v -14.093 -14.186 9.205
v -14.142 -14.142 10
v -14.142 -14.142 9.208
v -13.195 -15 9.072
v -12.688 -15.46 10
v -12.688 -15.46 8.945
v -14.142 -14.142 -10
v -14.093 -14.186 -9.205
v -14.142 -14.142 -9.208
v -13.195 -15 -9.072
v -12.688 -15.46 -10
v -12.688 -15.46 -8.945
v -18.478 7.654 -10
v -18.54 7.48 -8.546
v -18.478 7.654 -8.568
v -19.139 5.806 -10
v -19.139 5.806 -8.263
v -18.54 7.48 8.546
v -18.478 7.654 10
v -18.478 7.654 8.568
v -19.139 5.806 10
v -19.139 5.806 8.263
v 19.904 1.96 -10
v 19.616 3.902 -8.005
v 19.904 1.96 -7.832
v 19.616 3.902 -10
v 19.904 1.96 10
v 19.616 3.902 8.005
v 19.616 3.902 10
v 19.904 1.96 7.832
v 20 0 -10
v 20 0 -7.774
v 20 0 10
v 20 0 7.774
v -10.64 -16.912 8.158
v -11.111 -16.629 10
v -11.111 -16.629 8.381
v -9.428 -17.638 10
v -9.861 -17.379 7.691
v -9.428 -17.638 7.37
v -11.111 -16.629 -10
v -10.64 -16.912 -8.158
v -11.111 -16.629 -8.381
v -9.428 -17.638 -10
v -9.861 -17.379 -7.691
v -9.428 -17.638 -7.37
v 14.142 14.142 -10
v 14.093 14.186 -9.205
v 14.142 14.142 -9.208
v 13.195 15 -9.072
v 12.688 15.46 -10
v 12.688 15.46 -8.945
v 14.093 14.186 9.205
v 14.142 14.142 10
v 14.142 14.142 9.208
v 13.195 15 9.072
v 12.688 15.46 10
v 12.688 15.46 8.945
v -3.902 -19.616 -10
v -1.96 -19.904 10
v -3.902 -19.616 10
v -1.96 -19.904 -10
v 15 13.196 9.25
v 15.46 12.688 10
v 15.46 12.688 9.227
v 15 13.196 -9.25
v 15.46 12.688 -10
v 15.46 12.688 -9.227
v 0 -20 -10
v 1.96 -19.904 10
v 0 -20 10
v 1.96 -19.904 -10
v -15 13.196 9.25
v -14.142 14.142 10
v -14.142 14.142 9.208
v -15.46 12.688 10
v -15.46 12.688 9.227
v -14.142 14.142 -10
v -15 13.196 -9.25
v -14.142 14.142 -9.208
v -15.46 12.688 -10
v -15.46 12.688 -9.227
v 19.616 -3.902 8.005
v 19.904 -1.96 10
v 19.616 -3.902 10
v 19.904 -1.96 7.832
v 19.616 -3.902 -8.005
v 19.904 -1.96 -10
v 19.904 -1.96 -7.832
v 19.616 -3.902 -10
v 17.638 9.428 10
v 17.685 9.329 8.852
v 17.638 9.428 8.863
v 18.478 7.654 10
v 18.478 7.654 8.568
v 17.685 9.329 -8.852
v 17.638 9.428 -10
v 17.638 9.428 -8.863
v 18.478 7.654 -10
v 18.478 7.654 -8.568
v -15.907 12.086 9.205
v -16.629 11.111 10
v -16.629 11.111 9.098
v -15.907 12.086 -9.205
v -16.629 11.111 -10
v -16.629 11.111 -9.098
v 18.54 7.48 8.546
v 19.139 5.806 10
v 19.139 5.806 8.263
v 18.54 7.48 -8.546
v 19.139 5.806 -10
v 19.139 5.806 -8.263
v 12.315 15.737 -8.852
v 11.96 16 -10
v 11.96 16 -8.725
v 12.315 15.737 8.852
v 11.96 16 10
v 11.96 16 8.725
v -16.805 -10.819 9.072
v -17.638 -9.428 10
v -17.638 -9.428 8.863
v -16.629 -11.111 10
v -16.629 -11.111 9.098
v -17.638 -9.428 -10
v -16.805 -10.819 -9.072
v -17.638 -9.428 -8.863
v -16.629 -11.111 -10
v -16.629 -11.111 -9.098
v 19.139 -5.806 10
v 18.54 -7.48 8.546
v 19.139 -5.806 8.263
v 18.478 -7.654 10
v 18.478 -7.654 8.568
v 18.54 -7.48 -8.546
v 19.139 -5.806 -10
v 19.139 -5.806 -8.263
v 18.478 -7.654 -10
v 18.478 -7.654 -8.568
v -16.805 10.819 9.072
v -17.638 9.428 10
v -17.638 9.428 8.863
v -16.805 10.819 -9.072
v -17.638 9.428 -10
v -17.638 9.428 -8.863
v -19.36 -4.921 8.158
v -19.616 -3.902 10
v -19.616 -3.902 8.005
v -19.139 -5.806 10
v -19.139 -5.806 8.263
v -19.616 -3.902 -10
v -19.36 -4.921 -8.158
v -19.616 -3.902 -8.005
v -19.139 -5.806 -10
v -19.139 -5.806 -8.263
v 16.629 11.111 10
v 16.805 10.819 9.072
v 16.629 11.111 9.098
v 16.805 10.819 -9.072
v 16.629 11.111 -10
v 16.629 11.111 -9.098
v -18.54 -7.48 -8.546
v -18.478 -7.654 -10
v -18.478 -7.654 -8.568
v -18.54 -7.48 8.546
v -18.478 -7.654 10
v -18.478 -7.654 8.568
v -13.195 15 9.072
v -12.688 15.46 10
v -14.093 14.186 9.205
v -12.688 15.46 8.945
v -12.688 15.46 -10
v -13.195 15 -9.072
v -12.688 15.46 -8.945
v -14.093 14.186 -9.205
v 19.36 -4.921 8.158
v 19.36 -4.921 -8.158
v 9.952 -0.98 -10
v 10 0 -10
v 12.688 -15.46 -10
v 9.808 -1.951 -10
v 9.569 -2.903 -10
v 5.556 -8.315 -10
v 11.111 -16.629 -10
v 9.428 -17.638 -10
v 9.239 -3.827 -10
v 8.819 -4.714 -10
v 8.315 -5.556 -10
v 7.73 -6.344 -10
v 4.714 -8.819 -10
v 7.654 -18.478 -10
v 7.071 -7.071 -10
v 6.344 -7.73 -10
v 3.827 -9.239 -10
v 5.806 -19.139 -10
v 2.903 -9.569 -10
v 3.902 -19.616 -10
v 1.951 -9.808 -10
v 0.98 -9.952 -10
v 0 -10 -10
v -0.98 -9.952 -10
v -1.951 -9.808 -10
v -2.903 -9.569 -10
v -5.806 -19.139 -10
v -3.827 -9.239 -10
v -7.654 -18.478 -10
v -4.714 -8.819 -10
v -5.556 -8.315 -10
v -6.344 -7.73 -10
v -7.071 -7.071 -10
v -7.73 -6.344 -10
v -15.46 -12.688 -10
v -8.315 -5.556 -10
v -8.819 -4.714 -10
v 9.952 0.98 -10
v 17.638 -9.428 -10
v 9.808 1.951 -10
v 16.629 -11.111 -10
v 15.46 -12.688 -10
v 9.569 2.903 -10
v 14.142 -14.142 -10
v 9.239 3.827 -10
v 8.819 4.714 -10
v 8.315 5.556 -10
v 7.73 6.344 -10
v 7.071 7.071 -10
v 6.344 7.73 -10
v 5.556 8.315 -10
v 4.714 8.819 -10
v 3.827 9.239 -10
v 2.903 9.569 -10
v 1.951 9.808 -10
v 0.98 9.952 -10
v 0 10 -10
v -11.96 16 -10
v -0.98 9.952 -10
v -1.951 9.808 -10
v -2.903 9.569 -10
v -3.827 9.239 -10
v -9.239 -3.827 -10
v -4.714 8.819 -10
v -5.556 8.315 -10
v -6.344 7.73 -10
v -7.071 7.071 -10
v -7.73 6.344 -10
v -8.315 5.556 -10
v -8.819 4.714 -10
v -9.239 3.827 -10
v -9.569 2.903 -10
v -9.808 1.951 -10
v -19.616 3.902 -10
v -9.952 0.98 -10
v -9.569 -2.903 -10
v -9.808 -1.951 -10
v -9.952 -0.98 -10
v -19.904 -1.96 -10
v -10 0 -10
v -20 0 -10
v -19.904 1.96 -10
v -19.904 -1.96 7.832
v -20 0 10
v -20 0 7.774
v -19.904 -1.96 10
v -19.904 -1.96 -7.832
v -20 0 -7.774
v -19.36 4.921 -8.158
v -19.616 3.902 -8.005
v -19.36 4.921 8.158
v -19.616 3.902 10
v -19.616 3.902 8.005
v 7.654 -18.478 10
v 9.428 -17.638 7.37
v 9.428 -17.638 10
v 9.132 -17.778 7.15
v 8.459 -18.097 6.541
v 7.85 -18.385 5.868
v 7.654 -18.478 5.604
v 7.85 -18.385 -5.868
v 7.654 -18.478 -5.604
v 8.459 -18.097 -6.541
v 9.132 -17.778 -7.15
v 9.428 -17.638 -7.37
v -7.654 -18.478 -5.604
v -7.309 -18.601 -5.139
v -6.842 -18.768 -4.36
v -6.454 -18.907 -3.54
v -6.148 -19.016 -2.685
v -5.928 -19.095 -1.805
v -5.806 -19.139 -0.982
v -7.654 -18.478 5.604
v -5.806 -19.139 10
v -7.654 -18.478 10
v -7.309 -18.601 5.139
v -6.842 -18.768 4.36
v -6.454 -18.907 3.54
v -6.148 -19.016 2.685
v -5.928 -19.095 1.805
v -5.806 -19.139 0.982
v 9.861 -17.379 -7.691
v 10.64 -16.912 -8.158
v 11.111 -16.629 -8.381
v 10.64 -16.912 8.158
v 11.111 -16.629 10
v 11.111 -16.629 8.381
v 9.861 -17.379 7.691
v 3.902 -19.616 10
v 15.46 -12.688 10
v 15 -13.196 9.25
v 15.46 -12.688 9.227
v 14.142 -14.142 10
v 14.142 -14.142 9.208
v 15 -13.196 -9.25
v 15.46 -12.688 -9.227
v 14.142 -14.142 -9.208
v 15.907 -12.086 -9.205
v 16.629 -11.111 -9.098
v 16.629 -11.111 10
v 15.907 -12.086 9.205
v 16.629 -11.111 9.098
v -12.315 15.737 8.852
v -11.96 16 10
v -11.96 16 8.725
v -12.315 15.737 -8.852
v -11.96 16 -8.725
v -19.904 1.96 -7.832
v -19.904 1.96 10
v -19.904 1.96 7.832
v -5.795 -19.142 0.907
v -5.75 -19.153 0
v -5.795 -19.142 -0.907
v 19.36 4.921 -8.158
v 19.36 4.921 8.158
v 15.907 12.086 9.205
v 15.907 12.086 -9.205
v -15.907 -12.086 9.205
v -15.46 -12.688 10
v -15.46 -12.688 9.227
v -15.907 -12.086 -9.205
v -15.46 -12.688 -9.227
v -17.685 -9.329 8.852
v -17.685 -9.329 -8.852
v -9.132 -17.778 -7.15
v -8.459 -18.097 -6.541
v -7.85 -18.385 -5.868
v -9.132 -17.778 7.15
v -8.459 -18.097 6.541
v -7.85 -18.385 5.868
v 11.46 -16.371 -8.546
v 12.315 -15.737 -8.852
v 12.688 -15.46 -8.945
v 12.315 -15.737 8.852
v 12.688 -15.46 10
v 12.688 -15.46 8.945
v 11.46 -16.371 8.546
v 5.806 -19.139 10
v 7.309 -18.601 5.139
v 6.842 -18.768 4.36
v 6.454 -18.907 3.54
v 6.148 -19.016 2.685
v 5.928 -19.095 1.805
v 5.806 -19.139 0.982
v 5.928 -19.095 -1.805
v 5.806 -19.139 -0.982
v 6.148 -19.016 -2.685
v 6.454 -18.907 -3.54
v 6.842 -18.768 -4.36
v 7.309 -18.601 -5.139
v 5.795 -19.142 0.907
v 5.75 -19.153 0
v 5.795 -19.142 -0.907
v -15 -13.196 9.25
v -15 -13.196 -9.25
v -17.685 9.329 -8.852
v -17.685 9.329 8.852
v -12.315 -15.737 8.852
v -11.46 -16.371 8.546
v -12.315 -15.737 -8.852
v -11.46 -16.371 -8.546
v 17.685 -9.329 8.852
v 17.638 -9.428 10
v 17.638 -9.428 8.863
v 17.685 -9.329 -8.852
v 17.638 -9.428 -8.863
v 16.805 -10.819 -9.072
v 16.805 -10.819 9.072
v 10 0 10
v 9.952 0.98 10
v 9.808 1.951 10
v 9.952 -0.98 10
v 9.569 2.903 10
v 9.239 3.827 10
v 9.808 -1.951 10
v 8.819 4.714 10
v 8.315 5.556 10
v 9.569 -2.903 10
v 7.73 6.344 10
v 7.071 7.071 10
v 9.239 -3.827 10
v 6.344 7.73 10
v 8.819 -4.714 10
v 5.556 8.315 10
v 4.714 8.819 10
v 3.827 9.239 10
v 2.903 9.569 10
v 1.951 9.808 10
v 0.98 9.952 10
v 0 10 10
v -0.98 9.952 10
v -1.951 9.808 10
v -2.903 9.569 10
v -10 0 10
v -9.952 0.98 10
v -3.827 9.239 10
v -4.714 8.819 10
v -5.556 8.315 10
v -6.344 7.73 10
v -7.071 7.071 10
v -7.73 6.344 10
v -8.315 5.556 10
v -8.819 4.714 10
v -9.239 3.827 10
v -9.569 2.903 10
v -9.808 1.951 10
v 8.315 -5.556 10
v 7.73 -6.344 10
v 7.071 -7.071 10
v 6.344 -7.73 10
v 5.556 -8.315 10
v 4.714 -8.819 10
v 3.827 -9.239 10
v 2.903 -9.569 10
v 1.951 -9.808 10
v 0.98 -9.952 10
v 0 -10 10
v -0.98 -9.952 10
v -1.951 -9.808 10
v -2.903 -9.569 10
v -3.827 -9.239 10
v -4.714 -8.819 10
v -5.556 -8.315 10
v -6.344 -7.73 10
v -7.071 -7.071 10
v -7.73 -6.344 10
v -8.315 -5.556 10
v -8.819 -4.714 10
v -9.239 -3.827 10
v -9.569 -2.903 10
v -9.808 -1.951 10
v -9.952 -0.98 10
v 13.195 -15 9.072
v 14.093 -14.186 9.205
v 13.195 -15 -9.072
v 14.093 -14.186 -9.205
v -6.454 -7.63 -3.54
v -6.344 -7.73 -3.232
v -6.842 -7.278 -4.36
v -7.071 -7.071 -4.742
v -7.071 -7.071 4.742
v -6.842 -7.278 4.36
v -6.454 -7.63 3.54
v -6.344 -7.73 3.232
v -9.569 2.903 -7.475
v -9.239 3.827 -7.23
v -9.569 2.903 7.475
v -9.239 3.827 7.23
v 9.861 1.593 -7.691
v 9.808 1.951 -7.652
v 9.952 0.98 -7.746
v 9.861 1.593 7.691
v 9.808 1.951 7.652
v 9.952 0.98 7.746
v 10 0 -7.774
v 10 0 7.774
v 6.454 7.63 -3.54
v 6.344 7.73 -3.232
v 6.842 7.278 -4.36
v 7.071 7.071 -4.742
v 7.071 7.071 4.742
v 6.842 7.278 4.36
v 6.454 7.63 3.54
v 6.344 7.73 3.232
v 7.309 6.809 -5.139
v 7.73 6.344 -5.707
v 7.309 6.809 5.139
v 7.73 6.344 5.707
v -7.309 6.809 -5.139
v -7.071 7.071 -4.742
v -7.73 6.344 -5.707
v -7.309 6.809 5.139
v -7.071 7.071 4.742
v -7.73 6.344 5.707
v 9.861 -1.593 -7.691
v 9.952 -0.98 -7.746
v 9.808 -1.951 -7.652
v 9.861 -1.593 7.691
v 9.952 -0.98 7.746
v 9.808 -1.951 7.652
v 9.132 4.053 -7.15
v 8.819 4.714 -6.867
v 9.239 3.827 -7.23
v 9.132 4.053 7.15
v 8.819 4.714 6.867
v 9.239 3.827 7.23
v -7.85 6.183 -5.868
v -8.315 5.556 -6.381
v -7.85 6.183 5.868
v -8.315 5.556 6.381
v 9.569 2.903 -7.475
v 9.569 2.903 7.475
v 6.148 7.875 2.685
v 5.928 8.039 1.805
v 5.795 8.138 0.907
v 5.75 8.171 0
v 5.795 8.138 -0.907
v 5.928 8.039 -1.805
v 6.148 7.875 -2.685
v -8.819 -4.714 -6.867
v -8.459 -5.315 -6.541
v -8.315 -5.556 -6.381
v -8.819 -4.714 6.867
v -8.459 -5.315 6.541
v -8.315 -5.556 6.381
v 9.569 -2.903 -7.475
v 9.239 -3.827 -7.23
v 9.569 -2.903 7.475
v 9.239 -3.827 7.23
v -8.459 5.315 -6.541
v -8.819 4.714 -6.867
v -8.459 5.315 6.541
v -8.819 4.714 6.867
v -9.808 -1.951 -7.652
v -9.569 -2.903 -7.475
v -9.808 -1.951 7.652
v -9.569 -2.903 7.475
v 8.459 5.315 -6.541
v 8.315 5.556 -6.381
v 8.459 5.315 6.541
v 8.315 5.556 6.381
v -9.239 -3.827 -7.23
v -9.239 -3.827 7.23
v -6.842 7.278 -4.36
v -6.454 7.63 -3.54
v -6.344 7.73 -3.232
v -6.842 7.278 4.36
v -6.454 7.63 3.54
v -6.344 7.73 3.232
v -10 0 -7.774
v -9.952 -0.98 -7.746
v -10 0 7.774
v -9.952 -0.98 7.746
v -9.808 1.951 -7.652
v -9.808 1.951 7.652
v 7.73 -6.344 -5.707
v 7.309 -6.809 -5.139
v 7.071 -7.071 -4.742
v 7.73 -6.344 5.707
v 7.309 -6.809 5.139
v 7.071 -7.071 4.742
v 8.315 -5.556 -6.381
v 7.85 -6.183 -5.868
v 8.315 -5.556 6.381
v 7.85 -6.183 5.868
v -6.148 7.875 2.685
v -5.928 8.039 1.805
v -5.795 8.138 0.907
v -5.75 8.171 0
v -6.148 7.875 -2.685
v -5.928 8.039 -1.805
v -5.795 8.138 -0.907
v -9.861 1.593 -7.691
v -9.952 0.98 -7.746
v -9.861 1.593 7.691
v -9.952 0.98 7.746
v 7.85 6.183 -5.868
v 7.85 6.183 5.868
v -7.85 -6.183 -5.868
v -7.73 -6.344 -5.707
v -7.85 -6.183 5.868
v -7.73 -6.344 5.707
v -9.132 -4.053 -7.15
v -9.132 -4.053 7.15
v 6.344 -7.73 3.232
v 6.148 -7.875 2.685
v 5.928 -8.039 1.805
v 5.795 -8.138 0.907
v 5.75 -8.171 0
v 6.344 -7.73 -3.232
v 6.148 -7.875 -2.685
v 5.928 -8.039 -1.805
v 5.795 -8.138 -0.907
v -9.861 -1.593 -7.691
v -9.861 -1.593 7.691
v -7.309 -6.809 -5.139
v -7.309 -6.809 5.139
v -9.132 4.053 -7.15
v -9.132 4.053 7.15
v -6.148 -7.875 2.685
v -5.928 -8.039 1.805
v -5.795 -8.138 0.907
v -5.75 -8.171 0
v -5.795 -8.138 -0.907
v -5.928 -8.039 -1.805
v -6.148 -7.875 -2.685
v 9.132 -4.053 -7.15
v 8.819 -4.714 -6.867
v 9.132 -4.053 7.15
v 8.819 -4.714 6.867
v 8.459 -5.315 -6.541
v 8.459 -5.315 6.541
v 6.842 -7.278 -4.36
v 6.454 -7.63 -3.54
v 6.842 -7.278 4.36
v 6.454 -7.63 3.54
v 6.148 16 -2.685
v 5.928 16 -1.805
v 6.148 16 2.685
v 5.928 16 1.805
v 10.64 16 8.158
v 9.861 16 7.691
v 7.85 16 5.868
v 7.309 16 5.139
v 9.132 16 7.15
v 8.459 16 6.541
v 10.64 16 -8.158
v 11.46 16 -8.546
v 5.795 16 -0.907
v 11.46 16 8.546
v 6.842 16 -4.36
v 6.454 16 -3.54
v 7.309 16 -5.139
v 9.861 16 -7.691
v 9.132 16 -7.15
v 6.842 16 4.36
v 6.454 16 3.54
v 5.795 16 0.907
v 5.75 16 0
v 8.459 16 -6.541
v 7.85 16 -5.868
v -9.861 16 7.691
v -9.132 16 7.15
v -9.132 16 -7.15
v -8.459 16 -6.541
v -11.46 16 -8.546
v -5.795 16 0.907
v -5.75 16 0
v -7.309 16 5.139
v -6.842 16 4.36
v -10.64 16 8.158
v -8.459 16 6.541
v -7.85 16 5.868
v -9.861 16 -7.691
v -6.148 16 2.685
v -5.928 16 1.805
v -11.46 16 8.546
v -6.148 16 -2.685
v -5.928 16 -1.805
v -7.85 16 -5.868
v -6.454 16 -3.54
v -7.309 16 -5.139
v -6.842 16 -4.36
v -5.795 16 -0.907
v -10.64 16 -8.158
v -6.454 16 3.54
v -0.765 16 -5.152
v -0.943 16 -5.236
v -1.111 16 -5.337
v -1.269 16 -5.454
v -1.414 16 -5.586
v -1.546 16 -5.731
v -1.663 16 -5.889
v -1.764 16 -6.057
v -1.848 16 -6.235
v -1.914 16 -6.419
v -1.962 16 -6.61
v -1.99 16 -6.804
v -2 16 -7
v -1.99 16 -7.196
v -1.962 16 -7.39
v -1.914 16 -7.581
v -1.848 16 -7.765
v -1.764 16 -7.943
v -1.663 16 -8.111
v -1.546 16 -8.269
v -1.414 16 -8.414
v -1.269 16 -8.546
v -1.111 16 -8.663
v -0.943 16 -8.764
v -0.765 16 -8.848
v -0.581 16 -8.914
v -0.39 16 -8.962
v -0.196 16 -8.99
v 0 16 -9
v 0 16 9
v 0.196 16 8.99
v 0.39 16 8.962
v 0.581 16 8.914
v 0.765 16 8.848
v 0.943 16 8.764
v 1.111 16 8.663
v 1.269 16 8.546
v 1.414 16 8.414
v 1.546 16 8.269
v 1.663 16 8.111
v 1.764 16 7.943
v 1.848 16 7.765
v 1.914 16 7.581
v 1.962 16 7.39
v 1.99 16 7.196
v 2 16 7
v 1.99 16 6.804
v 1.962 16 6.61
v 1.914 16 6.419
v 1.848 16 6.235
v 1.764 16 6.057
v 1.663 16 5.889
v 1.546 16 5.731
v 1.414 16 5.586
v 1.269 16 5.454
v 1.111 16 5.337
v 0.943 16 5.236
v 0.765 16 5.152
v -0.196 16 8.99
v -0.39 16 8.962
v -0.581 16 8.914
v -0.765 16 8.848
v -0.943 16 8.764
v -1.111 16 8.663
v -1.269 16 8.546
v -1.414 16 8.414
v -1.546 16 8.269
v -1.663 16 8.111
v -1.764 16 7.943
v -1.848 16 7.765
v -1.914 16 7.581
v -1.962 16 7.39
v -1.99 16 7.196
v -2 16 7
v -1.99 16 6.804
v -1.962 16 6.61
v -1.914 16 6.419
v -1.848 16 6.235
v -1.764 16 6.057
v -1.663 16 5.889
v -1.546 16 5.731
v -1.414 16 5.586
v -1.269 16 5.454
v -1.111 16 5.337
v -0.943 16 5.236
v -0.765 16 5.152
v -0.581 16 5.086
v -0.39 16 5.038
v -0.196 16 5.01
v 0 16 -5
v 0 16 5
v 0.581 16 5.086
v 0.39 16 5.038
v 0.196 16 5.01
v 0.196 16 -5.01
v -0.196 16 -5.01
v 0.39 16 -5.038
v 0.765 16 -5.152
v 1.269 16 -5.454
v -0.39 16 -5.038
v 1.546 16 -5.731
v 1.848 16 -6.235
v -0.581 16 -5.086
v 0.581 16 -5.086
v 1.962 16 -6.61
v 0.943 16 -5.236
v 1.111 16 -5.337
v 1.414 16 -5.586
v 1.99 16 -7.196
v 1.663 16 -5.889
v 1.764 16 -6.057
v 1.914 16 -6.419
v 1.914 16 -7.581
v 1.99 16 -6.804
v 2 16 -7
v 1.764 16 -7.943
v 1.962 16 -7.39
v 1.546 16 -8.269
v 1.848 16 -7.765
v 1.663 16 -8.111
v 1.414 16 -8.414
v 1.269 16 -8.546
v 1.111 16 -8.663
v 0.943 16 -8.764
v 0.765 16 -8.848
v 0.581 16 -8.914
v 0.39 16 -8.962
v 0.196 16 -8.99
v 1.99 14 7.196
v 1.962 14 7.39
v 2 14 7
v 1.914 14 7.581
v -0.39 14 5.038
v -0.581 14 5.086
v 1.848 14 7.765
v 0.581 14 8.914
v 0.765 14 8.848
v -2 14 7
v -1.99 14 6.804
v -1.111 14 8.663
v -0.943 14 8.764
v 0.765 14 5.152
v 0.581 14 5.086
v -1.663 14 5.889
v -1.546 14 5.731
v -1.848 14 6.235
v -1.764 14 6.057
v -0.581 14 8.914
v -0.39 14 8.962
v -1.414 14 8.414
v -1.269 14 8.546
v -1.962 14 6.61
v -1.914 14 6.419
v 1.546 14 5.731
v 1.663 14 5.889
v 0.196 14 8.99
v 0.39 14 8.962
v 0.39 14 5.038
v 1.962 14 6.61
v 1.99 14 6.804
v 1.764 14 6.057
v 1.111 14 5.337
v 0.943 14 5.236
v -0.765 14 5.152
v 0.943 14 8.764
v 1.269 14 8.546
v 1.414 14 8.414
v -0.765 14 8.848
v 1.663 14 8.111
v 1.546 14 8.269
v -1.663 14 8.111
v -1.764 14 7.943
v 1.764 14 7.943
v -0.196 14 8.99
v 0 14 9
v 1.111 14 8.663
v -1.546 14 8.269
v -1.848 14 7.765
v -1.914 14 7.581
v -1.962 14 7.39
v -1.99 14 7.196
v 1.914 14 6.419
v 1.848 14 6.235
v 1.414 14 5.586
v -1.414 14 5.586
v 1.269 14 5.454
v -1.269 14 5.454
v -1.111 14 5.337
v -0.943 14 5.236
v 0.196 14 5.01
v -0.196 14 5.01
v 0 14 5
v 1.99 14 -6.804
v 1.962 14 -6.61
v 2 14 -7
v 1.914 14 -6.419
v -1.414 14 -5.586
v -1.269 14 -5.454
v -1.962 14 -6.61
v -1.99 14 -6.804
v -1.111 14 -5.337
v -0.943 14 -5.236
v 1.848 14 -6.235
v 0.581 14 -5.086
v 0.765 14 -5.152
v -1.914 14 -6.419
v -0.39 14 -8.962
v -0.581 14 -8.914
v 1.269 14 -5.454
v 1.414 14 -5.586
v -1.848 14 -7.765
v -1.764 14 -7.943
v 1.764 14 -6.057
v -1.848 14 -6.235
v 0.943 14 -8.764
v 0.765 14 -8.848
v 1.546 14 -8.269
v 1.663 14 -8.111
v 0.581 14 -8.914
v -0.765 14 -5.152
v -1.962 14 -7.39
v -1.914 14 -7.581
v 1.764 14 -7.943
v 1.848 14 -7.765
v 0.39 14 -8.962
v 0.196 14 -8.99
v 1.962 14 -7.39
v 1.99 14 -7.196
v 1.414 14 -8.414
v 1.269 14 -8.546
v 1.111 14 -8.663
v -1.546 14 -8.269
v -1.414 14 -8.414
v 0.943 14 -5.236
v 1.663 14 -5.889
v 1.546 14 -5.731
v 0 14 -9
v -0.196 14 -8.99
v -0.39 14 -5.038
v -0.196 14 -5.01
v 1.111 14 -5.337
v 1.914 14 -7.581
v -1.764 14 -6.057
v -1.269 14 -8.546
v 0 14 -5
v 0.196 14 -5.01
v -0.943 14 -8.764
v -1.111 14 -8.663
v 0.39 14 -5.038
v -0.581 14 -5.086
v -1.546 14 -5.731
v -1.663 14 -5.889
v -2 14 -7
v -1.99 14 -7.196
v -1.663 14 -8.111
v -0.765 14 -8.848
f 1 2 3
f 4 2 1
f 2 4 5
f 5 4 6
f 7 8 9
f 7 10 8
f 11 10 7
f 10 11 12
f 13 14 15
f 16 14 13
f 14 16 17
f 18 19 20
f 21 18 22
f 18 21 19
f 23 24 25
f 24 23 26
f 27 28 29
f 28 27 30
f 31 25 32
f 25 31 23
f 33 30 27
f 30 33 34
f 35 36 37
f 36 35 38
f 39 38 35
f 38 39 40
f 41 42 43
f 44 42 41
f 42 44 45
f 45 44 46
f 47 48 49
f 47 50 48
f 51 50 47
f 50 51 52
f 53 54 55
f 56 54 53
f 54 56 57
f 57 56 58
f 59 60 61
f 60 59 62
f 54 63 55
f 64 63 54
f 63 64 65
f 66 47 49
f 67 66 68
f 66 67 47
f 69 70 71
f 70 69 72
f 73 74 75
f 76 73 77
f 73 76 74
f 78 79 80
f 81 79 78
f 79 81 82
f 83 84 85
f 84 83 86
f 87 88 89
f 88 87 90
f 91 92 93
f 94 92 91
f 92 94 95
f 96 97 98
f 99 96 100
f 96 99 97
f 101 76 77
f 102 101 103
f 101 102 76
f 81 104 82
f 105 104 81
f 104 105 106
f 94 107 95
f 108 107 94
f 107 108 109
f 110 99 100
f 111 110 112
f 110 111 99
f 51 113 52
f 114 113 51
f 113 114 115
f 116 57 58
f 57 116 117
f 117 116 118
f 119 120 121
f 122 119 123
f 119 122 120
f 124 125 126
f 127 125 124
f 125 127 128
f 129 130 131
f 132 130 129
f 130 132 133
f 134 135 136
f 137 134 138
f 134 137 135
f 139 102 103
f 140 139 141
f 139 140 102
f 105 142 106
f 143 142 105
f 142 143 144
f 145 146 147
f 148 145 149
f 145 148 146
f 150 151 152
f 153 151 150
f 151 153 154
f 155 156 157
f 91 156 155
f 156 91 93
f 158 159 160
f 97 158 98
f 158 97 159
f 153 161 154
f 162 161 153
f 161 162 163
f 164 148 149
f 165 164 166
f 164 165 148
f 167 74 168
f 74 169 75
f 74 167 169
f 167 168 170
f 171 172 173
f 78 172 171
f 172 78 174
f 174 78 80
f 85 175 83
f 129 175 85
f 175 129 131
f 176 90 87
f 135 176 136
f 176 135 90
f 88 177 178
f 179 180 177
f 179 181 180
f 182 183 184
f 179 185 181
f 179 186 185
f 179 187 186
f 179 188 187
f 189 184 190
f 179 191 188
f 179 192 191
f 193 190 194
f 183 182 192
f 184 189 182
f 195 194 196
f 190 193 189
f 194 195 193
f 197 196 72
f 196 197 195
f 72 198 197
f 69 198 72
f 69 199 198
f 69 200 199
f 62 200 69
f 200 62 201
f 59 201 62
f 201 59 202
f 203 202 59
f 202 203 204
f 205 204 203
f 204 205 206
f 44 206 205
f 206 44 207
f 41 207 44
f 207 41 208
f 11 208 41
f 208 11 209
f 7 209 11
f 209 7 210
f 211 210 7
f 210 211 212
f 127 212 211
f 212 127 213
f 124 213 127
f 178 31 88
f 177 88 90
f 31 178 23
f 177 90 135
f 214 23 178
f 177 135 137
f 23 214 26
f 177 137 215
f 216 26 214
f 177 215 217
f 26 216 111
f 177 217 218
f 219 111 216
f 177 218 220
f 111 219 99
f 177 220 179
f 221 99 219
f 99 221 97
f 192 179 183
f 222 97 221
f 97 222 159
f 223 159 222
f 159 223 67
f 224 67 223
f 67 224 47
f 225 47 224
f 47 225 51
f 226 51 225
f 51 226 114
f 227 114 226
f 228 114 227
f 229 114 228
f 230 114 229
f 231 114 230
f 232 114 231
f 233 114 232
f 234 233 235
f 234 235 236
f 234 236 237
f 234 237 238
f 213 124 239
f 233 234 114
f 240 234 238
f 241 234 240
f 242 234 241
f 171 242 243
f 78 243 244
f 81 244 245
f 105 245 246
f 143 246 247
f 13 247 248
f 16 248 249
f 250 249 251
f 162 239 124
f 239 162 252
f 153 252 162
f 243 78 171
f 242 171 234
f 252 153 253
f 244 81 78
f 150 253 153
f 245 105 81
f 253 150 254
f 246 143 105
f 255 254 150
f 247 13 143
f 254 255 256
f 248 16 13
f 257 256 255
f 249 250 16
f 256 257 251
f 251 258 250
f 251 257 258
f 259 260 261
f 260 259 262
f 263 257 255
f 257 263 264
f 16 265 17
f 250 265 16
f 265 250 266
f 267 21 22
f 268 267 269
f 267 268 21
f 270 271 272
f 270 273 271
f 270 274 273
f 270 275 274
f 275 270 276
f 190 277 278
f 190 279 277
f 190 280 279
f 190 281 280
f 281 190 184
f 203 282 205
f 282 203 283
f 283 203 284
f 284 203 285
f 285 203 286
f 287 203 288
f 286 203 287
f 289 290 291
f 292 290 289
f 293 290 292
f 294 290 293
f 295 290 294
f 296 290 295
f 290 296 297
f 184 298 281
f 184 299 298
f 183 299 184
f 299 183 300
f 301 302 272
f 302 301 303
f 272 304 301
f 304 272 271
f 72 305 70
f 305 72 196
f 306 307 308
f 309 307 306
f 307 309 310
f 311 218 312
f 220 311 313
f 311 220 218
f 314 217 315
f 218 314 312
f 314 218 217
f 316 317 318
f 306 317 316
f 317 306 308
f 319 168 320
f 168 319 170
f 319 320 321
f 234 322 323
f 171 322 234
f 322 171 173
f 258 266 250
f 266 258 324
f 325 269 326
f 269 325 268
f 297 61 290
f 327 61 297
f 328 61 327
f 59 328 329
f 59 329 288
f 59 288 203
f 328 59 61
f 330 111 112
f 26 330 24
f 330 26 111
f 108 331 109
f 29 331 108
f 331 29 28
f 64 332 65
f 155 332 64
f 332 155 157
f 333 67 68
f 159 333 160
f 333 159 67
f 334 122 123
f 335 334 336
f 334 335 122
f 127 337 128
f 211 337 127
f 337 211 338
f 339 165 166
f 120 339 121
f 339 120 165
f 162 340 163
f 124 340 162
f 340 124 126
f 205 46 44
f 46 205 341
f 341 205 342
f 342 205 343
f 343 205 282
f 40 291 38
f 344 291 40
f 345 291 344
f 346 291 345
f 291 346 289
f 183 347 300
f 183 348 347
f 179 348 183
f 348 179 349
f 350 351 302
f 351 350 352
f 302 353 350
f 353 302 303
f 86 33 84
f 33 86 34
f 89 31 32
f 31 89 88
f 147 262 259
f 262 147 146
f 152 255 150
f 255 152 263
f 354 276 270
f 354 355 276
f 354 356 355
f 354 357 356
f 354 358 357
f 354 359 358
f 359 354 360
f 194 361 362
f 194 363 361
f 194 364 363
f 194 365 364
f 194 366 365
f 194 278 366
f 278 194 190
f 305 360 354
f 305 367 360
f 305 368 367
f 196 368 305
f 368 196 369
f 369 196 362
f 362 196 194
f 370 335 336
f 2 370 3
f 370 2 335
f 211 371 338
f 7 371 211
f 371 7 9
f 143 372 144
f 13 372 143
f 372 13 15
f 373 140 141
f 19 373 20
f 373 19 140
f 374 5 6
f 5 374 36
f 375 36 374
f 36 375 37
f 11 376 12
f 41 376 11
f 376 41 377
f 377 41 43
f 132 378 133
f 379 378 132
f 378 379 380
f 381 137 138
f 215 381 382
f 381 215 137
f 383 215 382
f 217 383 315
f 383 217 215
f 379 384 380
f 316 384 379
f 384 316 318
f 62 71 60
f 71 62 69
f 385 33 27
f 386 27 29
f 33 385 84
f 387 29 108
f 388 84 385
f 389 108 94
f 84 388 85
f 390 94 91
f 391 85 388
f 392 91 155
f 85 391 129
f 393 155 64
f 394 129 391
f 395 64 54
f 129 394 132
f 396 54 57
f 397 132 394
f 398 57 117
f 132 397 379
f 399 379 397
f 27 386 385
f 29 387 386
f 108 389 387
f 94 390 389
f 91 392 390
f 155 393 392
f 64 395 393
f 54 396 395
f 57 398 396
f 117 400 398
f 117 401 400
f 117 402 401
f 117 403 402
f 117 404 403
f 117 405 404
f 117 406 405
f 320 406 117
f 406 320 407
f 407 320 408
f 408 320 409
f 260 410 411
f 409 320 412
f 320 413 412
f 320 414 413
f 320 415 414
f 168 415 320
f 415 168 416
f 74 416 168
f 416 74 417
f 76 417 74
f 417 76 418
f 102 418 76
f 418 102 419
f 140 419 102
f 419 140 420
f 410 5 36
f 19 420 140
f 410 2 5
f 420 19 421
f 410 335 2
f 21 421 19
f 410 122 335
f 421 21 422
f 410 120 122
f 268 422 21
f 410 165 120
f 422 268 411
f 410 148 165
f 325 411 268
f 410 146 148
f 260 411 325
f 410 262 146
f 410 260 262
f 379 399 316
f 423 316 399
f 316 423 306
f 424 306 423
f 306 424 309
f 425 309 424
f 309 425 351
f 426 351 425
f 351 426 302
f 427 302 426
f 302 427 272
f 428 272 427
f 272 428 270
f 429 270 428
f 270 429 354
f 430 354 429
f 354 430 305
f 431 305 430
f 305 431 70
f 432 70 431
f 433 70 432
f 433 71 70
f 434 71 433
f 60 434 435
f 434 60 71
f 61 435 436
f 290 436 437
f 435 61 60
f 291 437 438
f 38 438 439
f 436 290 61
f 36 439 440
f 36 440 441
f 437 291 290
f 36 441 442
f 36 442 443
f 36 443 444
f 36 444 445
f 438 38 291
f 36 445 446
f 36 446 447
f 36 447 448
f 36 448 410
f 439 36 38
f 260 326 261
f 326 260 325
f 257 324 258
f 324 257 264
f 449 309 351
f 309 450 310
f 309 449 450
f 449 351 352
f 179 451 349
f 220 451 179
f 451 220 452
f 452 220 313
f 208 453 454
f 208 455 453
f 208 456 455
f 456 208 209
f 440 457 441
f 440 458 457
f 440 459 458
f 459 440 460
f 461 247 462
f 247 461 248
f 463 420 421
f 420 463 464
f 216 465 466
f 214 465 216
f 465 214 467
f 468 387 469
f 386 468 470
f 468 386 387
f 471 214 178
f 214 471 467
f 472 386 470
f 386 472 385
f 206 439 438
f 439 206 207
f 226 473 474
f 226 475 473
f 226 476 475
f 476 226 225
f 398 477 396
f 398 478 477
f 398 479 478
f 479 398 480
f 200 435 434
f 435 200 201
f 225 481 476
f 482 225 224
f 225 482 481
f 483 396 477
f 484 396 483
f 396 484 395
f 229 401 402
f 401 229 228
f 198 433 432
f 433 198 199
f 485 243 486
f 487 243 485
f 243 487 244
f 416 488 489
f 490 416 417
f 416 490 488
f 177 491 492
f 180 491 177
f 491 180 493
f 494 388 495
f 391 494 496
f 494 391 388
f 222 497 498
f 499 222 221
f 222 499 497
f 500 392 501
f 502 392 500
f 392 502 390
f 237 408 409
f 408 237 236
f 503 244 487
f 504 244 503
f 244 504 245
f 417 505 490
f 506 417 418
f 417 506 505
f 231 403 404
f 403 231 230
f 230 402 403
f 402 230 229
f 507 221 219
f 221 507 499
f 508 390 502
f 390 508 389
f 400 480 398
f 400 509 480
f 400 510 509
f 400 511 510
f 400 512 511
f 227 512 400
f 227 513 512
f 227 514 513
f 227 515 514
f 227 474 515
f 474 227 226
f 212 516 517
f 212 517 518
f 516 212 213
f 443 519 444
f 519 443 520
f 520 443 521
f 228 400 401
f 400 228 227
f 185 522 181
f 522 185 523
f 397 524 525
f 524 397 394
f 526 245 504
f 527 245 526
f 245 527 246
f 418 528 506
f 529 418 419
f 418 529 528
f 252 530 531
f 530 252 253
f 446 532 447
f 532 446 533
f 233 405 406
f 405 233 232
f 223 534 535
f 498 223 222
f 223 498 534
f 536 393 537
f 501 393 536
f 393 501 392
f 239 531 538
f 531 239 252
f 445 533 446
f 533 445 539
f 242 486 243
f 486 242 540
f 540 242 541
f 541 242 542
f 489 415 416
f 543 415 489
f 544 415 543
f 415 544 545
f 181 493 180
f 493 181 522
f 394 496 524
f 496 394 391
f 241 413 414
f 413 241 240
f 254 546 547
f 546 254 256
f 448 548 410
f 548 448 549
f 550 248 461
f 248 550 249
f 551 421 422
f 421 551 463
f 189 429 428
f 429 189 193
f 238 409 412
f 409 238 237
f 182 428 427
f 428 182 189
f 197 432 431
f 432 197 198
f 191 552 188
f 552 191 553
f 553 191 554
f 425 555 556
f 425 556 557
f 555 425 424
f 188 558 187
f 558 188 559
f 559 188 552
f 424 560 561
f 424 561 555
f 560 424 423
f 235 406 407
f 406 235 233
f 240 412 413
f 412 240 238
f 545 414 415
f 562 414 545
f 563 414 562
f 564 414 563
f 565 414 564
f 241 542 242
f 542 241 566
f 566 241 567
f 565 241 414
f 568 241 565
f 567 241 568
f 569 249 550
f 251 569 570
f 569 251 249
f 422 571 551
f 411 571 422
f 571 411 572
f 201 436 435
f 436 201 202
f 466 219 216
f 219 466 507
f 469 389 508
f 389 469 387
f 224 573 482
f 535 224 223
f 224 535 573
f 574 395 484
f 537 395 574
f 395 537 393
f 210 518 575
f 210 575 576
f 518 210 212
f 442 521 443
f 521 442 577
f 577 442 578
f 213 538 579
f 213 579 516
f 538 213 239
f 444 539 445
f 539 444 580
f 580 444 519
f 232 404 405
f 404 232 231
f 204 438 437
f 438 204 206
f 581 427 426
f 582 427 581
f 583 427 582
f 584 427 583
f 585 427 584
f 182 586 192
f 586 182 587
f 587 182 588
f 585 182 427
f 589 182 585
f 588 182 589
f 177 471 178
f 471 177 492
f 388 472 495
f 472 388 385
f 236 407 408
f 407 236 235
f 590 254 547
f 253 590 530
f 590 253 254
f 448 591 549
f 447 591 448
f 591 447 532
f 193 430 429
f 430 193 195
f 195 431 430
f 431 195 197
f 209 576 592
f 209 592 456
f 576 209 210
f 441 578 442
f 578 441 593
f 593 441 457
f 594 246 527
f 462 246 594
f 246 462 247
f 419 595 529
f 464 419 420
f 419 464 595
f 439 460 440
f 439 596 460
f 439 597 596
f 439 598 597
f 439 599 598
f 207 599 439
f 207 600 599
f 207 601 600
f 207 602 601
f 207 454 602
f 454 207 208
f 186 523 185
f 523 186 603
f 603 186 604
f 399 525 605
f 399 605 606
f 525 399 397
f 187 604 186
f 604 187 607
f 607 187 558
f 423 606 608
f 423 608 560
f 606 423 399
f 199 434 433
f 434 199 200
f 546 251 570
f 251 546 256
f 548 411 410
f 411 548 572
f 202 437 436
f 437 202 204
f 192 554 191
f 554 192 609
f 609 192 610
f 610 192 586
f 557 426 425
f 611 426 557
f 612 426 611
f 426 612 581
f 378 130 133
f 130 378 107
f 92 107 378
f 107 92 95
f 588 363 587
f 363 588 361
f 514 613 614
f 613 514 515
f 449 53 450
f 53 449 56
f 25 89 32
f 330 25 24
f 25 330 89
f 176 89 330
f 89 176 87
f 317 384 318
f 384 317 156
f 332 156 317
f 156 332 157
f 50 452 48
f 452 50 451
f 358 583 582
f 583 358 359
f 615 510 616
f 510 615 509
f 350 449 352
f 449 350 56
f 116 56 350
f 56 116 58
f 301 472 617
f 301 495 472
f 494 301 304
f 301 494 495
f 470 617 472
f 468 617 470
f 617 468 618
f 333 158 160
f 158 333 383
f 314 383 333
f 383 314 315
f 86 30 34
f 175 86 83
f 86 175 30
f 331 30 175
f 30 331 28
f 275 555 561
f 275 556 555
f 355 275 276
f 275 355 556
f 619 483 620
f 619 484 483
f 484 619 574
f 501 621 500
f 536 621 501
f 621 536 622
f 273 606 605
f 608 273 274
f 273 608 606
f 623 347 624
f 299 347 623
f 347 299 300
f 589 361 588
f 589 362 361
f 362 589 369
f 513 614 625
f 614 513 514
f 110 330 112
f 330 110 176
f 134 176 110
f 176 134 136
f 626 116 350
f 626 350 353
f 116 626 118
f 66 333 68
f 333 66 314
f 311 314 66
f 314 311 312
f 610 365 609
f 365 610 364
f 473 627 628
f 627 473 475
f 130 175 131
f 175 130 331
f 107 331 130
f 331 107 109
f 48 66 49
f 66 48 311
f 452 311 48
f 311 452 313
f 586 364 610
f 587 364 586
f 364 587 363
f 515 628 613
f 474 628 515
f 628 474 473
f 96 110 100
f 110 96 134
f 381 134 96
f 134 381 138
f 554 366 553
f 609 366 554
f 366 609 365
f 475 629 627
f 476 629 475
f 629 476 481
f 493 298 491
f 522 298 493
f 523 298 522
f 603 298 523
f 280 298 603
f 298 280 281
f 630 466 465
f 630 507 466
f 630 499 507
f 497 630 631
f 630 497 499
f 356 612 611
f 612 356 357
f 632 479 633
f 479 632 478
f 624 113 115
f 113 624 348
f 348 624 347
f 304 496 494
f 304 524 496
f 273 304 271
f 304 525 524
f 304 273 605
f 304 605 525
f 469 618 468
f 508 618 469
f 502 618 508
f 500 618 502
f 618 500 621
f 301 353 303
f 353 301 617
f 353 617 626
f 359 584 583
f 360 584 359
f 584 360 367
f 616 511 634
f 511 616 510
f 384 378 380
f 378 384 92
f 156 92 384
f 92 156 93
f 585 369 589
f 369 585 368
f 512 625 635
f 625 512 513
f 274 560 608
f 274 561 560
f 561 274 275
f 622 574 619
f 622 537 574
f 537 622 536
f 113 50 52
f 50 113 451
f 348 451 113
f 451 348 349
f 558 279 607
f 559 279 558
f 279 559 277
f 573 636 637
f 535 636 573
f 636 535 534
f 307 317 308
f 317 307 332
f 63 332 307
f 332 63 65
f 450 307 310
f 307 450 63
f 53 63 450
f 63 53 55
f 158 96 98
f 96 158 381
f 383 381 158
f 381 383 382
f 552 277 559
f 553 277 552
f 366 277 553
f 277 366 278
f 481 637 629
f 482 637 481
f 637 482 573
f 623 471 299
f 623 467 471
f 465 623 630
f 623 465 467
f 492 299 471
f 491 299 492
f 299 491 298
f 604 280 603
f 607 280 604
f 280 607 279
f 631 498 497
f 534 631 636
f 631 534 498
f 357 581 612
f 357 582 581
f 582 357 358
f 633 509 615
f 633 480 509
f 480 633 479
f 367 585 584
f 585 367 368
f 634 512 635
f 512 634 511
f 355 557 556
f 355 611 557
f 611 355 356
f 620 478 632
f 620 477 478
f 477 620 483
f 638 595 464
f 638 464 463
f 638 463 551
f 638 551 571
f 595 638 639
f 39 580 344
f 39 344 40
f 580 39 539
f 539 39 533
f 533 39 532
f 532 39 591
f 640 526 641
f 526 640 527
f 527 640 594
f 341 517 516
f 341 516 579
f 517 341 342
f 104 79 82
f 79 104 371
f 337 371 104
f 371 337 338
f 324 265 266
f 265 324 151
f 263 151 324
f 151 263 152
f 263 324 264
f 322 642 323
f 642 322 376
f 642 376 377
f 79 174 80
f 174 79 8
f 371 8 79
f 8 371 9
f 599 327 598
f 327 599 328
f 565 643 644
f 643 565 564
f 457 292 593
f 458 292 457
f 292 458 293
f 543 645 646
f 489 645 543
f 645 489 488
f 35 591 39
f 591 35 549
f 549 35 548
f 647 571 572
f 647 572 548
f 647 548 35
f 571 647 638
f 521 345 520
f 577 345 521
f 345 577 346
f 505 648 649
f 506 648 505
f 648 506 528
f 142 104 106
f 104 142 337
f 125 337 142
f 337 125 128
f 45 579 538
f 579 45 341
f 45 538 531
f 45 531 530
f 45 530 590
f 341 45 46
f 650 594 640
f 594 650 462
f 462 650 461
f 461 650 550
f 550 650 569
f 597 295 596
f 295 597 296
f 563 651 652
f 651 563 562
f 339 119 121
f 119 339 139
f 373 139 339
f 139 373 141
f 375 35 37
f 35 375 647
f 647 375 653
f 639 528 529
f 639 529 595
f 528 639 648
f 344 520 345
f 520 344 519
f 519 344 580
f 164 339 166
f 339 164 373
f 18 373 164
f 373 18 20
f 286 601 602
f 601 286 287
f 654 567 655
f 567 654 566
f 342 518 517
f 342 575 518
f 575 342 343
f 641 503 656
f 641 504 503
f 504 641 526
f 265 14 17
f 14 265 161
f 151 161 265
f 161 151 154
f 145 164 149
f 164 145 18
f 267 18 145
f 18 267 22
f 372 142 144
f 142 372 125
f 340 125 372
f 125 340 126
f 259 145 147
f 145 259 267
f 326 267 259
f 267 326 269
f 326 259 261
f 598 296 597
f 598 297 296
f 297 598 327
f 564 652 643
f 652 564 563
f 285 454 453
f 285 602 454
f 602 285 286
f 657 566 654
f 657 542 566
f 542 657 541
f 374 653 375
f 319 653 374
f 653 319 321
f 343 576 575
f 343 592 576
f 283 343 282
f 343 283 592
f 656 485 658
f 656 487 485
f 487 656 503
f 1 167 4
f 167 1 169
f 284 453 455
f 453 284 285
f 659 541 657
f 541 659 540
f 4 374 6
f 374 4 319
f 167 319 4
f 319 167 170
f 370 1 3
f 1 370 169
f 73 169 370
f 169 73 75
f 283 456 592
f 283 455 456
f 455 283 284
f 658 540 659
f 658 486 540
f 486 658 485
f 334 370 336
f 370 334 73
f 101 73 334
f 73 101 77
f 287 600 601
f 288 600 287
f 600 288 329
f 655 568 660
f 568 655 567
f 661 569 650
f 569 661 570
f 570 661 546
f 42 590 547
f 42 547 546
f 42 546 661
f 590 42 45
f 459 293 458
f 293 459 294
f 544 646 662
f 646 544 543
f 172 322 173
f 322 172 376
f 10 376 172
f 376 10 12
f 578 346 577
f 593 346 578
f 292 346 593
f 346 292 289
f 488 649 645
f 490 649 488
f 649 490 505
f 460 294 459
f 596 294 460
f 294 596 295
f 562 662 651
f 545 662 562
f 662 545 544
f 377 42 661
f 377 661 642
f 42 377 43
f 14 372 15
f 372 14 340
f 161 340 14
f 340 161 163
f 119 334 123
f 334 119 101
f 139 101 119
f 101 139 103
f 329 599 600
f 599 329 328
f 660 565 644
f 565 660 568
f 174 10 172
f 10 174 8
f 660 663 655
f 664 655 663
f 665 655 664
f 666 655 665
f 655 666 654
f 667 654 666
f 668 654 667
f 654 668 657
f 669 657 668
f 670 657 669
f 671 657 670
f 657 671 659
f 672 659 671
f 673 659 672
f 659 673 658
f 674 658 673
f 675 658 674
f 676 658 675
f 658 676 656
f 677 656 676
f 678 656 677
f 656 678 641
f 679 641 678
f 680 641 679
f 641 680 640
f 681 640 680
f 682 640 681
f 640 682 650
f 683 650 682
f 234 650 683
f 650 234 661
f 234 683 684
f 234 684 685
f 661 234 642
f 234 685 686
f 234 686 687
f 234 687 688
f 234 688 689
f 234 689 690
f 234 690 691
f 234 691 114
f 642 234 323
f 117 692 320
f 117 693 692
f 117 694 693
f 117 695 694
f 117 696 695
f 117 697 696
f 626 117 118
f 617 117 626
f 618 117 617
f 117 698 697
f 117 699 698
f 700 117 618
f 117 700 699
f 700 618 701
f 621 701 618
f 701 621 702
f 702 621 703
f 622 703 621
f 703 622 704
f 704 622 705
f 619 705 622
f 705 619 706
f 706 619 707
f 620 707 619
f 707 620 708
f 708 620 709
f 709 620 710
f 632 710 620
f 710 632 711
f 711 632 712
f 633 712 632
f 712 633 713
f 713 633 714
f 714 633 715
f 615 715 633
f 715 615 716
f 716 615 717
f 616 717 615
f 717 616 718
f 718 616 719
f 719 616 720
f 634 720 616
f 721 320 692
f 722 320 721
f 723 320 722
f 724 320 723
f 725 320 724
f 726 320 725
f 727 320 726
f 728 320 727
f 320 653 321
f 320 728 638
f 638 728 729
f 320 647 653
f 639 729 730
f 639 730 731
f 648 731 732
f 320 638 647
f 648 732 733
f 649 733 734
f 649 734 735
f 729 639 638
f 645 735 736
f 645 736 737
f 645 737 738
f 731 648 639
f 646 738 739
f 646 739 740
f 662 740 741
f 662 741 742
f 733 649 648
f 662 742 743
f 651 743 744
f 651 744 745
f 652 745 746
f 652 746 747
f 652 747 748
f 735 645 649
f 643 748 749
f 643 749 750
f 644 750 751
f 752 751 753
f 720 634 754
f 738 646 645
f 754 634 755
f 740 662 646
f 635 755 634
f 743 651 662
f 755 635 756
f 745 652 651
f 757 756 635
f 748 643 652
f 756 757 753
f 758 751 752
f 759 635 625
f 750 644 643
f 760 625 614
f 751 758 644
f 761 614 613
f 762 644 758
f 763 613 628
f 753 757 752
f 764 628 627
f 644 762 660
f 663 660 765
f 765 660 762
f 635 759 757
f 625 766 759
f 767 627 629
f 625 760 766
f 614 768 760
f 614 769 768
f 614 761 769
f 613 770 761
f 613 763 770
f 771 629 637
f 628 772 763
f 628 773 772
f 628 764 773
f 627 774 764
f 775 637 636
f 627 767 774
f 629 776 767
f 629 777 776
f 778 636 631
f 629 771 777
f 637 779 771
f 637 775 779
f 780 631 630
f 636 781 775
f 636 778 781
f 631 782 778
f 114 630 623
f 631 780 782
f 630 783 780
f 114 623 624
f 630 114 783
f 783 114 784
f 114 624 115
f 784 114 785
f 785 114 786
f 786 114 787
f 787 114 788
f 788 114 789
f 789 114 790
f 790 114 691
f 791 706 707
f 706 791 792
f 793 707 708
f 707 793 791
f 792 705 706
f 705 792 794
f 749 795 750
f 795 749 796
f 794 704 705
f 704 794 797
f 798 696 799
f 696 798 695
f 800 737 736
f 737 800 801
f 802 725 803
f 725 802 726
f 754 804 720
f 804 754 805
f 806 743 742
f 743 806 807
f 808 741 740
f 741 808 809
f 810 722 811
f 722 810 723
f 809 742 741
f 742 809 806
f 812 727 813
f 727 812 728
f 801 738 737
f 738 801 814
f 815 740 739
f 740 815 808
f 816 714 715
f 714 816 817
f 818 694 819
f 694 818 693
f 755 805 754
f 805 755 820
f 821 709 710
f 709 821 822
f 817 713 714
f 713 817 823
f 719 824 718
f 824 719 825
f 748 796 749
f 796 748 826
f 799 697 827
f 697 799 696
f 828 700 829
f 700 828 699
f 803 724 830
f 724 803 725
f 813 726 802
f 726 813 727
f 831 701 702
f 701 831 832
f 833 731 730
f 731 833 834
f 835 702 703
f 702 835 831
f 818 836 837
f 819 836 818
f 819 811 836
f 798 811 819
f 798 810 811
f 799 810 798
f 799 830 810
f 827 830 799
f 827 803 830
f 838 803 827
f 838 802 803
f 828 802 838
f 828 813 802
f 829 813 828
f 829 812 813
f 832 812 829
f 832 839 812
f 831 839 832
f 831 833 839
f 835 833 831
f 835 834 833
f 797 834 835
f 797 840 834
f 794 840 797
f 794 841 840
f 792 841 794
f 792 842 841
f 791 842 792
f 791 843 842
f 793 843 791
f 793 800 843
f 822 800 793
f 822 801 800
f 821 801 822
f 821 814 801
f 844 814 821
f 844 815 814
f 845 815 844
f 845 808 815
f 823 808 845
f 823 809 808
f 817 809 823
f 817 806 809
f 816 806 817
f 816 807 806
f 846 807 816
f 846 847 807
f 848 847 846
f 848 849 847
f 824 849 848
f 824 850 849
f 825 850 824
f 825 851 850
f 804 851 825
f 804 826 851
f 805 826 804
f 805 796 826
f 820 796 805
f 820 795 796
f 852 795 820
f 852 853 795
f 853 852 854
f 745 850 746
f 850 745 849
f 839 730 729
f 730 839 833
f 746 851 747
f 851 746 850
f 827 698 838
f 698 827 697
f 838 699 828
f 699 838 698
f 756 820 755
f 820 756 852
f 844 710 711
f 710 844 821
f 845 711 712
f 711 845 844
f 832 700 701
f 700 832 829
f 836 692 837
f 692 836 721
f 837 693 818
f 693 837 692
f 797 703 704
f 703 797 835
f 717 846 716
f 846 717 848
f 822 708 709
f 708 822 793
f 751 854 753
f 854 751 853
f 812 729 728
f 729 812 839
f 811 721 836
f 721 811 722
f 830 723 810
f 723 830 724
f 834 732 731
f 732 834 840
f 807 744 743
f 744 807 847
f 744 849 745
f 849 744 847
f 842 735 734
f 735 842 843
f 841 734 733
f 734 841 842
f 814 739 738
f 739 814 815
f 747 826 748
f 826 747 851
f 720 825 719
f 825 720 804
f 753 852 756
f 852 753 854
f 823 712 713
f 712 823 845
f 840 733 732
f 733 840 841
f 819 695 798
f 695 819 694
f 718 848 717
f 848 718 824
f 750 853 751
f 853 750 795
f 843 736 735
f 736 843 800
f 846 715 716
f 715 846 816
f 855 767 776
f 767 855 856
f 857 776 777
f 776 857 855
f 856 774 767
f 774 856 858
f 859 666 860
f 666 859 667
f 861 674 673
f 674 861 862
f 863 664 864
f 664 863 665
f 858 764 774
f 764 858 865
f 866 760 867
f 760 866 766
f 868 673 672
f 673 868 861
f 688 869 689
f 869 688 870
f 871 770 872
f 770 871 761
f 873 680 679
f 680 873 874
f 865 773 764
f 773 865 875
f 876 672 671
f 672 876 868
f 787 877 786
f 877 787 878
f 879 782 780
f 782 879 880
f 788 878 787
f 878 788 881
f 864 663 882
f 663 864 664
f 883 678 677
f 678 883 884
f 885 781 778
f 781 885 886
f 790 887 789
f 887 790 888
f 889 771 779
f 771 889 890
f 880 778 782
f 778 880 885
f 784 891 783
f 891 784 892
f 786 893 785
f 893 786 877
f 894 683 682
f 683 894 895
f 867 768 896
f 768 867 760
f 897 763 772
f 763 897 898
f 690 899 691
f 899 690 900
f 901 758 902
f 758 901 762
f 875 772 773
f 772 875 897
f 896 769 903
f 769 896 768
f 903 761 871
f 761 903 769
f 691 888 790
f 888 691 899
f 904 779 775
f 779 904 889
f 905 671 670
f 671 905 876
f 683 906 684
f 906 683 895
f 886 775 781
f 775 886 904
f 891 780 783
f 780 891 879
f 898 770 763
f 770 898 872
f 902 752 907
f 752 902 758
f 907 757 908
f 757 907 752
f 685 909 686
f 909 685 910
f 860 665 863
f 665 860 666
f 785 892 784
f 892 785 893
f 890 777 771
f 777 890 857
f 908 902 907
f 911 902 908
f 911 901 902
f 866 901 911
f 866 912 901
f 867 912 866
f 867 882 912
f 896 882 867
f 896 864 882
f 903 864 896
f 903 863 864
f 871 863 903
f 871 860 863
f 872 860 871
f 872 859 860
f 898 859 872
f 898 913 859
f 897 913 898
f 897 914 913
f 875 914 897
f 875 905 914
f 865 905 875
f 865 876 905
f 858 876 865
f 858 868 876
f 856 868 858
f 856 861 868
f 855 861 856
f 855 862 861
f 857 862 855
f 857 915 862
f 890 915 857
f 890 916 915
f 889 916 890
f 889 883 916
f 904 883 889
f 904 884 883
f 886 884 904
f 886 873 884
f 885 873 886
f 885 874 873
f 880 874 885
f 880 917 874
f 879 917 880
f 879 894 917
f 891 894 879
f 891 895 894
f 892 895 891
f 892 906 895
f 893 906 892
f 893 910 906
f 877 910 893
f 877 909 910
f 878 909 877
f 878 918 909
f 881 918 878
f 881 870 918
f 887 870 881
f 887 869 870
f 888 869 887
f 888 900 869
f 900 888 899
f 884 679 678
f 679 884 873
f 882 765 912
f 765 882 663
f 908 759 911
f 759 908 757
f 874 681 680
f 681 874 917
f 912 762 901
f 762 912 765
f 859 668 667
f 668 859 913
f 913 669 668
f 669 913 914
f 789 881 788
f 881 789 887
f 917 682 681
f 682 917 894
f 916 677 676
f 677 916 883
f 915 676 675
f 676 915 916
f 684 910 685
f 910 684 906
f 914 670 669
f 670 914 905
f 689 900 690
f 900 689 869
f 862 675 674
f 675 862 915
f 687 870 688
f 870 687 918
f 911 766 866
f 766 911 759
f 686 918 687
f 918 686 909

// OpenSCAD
// COBRA Vertebra - T12 V18
// Height: 20.0mm, OD: 40.0mm

$fn = 64;

difference() {
    // Outer cylinder
    cylinder(h=20.0, d=40.0, center=true);
    
    // Inner channel
    cylinder(h=22.0, d=20.0, center=true);

    // Battery cavity 1
    rotate([0, 0, 0])
    translate([15.0, 0, 0])
    rotate([90, 0, 0])
    cylinder(h=74.0, d=18.5, center=true);

    // Battery cavity 2
    rotate([0, 0, 180])
    translate([15.0, 0, 0])
    rotate([90, 0, 0])
    cylinder(h=74.0, d=18.5, center=true);

    // Solar panel cavity
    translate([0, 18.0, 0])
    cube([50, 4, 30], center=true);

    // Pivot holes
    translate([0, 20.0, 7.0])
    rotate([90, 0, 0])
    cylinder(h=12.0, d=4, center=true);
    
    translate([0, 20.0, -7.0])
    rotate([90, 0, 0])
    cylinder(h=12.0, d=4, center=true);
}
